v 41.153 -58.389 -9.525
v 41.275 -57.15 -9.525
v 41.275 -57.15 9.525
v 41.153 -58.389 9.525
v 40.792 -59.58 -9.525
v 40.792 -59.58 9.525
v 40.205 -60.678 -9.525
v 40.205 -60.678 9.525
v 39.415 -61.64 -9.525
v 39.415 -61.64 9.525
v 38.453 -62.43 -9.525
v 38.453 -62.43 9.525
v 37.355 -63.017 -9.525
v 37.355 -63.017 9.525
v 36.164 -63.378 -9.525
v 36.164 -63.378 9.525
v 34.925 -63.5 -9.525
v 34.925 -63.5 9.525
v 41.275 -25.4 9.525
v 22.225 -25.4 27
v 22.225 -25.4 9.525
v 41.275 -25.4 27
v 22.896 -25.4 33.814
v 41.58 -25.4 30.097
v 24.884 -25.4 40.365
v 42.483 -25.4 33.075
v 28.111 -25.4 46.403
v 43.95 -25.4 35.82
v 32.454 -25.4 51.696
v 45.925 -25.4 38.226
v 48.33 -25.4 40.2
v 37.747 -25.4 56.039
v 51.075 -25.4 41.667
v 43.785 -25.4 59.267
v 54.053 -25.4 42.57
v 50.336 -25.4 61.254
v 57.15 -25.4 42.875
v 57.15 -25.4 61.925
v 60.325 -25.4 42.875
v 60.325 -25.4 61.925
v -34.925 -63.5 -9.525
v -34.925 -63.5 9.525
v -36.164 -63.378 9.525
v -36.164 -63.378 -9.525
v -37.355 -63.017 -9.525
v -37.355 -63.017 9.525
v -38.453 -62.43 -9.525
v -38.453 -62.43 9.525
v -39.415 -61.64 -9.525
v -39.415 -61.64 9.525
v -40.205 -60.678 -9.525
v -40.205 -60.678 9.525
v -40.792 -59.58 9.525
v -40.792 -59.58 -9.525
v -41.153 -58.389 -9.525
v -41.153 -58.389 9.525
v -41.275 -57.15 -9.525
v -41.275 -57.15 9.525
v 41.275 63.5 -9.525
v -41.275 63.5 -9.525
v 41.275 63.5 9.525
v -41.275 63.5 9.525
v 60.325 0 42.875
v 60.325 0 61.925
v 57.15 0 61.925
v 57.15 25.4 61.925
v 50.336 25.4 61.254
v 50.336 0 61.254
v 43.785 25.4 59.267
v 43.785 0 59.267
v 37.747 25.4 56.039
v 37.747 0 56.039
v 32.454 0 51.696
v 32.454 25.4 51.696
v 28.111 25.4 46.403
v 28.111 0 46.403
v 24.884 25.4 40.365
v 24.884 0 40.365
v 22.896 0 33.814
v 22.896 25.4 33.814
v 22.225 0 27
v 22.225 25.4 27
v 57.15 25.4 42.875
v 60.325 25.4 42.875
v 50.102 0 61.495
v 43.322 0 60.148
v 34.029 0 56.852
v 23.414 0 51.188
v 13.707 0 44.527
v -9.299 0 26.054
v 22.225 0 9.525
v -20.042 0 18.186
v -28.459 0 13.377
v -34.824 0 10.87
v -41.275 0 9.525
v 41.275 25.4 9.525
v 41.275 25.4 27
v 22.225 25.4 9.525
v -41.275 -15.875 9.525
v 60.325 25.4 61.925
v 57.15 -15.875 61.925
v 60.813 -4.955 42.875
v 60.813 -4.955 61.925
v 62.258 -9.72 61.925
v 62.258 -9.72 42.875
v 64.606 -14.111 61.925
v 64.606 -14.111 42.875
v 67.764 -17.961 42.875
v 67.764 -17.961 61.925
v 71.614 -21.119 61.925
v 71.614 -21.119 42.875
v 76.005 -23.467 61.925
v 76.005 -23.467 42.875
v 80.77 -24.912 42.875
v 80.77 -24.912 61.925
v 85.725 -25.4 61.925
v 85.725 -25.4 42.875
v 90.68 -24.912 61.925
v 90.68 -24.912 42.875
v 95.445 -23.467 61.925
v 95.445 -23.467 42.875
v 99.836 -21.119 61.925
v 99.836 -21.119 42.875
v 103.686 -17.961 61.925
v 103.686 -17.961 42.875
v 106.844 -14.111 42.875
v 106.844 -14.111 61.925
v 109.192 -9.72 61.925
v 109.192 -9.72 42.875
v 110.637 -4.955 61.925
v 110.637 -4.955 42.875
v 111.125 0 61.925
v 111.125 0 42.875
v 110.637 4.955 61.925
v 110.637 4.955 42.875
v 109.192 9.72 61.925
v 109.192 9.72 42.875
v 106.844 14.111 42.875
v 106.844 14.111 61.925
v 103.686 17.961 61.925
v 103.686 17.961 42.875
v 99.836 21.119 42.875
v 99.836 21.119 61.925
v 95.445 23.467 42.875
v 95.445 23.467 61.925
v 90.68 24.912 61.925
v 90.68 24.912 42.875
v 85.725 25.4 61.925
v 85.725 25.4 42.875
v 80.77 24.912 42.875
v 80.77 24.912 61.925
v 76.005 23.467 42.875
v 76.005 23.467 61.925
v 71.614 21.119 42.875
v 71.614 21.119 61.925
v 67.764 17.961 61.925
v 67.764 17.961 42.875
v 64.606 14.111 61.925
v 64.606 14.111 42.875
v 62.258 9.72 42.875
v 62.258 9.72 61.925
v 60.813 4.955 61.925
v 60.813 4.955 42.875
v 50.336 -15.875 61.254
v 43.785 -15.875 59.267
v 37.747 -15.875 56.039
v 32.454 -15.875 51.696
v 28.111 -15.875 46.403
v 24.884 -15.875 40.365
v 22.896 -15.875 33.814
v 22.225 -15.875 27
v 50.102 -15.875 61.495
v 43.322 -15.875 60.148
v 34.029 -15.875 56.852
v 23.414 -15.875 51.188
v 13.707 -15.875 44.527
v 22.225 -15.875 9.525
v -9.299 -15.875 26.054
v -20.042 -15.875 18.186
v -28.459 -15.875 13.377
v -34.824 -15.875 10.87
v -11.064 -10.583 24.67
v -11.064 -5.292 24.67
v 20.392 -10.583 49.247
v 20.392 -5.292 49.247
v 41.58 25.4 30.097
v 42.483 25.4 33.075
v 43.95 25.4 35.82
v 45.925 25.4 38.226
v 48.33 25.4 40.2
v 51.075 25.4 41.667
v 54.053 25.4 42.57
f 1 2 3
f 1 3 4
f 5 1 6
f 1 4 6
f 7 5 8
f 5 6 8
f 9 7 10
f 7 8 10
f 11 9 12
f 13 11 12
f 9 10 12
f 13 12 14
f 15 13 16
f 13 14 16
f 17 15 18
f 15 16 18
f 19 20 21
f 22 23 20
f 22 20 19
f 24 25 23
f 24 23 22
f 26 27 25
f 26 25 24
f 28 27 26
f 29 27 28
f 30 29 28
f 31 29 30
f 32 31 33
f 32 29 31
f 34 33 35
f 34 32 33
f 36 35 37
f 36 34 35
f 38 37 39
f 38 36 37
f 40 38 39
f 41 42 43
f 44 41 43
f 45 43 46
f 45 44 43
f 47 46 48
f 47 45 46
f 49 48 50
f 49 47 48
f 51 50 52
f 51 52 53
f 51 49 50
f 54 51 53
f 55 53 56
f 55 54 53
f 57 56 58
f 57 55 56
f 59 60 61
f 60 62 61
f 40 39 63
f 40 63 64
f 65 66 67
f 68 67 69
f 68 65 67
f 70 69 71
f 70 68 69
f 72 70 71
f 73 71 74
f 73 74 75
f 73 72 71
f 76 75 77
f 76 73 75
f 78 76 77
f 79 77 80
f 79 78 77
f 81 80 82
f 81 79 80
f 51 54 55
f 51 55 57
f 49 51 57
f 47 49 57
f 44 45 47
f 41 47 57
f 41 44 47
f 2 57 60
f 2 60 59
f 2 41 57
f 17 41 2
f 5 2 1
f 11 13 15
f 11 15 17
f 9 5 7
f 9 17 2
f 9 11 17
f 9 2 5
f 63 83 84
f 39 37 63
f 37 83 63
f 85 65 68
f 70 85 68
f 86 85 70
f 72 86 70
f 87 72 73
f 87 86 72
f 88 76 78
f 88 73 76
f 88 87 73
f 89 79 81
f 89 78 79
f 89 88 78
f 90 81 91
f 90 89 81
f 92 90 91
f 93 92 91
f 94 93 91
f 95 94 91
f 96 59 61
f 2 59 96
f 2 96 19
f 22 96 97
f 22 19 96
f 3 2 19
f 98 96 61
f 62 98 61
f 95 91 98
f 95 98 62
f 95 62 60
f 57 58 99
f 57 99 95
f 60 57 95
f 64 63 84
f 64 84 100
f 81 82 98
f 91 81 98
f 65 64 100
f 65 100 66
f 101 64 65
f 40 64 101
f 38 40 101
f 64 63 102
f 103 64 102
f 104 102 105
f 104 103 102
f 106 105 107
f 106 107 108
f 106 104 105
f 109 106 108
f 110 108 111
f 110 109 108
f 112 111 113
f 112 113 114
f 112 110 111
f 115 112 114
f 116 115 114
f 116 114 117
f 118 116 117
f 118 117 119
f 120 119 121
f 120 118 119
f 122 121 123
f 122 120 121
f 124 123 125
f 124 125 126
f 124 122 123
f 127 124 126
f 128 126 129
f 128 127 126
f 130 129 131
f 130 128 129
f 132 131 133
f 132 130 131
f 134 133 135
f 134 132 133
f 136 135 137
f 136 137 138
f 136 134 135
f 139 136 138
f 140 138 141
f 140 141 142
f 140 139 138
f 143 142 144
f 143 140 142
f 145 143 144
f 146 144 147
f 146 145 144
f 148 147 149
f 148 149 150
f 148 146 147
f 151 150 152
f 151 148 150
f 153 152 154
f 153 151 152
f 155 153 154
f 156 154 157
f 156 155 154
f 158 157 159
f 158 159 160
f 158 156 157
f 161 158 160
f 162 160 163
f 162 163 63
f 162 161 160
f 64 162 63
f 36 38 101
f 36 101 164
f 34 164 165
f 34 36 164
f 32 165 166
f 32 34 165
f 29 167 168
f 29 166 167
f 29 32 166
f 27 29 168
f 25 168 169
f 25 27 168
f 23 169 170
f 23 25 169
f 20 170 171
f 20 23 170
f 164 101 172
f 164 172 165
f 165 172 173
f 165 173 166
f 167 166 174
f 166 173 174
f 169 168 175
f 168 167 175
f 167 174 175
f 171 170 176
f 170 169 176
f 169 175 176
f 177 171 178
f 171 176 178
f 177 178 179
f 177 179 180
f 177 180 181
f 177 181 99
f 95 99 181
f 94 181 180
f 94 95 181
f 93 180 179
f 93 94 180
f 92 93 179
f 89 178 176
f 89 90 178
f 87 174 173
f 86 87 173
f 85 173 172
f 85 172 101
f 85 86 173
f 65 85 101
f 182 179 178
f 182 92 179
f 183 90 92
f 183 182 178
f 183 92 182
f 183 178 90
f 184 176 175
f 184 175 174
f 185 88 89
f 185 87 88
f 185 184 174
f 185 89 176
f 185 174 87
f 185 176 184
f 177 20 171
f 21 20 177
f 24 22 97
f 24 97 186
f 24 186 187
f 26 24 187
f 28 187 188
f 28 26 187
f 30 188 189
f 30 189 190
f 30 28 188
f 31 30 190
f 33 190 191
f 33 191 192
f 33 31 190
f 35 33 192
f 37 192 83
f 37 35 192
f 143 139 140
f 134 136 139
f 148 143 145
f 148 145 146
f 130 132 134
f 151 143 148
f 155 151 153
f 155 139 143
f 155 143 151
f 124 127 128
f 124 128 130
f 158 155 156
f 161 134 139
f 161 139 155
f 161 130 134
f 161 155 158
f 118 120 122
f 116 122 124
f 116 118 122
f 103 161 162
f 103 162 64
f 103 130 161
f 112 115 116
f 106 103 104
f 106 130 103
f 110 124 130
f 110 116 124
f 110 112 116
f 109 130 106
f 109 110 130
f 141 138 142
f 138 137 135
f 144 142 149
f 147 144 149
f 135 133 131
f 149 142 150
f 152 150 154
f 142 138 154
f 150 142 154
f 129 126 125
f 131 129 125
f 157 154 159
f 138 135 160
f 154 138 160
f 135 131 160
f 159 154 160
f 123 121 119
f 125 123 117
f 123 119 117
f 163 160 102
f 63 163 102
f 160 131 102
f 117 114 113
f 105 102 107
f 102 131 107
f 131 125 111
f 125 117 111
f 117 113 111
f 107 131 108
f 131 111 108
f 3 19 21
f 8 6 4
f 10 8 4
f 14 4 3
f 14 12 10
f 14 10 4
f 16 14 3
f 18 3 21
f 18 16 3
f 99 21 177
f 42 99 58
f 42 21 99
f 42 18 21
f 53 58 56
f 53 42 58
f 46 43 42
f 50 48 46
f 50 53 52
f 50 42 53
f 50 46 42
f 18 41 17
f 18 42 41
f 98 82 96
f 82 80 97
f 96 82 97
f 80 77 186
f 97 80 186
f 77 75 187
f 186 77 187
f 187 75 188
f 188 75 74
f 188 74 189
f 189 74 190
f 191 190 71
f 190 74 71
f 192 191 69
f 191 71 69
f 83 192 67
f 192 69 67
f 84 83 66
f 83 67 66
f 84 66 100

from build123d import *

# Parameters (mm, degrees)
F1_DEPTH = 63.5
F2_DEPTH = 25.4
F3_DEPTH = 15.875
F0_W     = 25.4
F0_H     = 19.05
F5_R     = 6.35


with BuildPart() as f1:
    # F0 (on Front) → F1 (new body, symmetric)
    with BuildSketch(Plane.XZ):
        Polygon((-41.275, -9.525), (41.275, -9.525), (41.275, 9.525), (22.225, 9.525), (-41.275, 9.525), align=None)
    extrude(amount=F1_DEPTH, both=True)

    # F0 (on Front) → F2 (join, symmetric)
    with BuildSketch(Plane.XZ):
        with BuildLine():
            Line((22.225, 9.525), (41.275, 9.525))
            Line((41.275, 9.525), (41.275, 27.0002))
            ThreePointArc((41.275, 27.0002), (45.9246798487, 38.2255201513), (57.15, 42.8752))
            Line((57.15, 42.8752), (60.325, 42.8752))
            Line((60.325, 42.8752), (60.325, 61.9252))
            Line((60.325, 61.9252), (57.15, 61.9252))
            ThreePointArc((57.15, 61.9252), (32.4542956671, 51.6959043329), (22.225, 27.0002))
            Line((22.225, 27.0002), (22.225, 9.525))
        make_face()
    extrude(amount=F2_DEPTH, both=True)

    # F0 (on Front) → F3 (join)
    with BuildSketch(Plane.XZ):
        with BuildLine():
            add(Edge.make_bspline(
                [(-41.275, 9.525), (-10.3348297998, 12.8418905661), (16.3892488927, 62.3086951673), (57.15, 61.9252)],
                knots=[0, 0, 0, 0, 111.5045361635, 111.5045361635, 111.5045361635, 111.5045361635], degree=3))
            Line((-41.275, 9.525), (22.225, 9.525))
            Line((22.225, 9.525), (22.225, 27.0002))
            ThreePointArc((22.225, 27.0002), (32.4542956671, 51.6959043329), (57.15, 61.9252))
        make_face()
    extrude(amount=F3_DEPTH)

    # F0 (on Front) → F4 (revolve)
    with BuildSketch(Plane.XZ):
        with Locations((73.025, 52.4002)):
            Rectangle(F0_W, F0_H)
    revolve(axis=Axis((85.725, 0, 52.3875), (0, 0, 1)))

    # F5
    f5_edges = [f1.edges().sort_by_distance(p)[0] for p in [
        (-41.275, -63.5, 0),
        (41.275, -63.5, 0),
    ]]
    fillet(f5_edges, radius=F5_R)


solid = f1.part
